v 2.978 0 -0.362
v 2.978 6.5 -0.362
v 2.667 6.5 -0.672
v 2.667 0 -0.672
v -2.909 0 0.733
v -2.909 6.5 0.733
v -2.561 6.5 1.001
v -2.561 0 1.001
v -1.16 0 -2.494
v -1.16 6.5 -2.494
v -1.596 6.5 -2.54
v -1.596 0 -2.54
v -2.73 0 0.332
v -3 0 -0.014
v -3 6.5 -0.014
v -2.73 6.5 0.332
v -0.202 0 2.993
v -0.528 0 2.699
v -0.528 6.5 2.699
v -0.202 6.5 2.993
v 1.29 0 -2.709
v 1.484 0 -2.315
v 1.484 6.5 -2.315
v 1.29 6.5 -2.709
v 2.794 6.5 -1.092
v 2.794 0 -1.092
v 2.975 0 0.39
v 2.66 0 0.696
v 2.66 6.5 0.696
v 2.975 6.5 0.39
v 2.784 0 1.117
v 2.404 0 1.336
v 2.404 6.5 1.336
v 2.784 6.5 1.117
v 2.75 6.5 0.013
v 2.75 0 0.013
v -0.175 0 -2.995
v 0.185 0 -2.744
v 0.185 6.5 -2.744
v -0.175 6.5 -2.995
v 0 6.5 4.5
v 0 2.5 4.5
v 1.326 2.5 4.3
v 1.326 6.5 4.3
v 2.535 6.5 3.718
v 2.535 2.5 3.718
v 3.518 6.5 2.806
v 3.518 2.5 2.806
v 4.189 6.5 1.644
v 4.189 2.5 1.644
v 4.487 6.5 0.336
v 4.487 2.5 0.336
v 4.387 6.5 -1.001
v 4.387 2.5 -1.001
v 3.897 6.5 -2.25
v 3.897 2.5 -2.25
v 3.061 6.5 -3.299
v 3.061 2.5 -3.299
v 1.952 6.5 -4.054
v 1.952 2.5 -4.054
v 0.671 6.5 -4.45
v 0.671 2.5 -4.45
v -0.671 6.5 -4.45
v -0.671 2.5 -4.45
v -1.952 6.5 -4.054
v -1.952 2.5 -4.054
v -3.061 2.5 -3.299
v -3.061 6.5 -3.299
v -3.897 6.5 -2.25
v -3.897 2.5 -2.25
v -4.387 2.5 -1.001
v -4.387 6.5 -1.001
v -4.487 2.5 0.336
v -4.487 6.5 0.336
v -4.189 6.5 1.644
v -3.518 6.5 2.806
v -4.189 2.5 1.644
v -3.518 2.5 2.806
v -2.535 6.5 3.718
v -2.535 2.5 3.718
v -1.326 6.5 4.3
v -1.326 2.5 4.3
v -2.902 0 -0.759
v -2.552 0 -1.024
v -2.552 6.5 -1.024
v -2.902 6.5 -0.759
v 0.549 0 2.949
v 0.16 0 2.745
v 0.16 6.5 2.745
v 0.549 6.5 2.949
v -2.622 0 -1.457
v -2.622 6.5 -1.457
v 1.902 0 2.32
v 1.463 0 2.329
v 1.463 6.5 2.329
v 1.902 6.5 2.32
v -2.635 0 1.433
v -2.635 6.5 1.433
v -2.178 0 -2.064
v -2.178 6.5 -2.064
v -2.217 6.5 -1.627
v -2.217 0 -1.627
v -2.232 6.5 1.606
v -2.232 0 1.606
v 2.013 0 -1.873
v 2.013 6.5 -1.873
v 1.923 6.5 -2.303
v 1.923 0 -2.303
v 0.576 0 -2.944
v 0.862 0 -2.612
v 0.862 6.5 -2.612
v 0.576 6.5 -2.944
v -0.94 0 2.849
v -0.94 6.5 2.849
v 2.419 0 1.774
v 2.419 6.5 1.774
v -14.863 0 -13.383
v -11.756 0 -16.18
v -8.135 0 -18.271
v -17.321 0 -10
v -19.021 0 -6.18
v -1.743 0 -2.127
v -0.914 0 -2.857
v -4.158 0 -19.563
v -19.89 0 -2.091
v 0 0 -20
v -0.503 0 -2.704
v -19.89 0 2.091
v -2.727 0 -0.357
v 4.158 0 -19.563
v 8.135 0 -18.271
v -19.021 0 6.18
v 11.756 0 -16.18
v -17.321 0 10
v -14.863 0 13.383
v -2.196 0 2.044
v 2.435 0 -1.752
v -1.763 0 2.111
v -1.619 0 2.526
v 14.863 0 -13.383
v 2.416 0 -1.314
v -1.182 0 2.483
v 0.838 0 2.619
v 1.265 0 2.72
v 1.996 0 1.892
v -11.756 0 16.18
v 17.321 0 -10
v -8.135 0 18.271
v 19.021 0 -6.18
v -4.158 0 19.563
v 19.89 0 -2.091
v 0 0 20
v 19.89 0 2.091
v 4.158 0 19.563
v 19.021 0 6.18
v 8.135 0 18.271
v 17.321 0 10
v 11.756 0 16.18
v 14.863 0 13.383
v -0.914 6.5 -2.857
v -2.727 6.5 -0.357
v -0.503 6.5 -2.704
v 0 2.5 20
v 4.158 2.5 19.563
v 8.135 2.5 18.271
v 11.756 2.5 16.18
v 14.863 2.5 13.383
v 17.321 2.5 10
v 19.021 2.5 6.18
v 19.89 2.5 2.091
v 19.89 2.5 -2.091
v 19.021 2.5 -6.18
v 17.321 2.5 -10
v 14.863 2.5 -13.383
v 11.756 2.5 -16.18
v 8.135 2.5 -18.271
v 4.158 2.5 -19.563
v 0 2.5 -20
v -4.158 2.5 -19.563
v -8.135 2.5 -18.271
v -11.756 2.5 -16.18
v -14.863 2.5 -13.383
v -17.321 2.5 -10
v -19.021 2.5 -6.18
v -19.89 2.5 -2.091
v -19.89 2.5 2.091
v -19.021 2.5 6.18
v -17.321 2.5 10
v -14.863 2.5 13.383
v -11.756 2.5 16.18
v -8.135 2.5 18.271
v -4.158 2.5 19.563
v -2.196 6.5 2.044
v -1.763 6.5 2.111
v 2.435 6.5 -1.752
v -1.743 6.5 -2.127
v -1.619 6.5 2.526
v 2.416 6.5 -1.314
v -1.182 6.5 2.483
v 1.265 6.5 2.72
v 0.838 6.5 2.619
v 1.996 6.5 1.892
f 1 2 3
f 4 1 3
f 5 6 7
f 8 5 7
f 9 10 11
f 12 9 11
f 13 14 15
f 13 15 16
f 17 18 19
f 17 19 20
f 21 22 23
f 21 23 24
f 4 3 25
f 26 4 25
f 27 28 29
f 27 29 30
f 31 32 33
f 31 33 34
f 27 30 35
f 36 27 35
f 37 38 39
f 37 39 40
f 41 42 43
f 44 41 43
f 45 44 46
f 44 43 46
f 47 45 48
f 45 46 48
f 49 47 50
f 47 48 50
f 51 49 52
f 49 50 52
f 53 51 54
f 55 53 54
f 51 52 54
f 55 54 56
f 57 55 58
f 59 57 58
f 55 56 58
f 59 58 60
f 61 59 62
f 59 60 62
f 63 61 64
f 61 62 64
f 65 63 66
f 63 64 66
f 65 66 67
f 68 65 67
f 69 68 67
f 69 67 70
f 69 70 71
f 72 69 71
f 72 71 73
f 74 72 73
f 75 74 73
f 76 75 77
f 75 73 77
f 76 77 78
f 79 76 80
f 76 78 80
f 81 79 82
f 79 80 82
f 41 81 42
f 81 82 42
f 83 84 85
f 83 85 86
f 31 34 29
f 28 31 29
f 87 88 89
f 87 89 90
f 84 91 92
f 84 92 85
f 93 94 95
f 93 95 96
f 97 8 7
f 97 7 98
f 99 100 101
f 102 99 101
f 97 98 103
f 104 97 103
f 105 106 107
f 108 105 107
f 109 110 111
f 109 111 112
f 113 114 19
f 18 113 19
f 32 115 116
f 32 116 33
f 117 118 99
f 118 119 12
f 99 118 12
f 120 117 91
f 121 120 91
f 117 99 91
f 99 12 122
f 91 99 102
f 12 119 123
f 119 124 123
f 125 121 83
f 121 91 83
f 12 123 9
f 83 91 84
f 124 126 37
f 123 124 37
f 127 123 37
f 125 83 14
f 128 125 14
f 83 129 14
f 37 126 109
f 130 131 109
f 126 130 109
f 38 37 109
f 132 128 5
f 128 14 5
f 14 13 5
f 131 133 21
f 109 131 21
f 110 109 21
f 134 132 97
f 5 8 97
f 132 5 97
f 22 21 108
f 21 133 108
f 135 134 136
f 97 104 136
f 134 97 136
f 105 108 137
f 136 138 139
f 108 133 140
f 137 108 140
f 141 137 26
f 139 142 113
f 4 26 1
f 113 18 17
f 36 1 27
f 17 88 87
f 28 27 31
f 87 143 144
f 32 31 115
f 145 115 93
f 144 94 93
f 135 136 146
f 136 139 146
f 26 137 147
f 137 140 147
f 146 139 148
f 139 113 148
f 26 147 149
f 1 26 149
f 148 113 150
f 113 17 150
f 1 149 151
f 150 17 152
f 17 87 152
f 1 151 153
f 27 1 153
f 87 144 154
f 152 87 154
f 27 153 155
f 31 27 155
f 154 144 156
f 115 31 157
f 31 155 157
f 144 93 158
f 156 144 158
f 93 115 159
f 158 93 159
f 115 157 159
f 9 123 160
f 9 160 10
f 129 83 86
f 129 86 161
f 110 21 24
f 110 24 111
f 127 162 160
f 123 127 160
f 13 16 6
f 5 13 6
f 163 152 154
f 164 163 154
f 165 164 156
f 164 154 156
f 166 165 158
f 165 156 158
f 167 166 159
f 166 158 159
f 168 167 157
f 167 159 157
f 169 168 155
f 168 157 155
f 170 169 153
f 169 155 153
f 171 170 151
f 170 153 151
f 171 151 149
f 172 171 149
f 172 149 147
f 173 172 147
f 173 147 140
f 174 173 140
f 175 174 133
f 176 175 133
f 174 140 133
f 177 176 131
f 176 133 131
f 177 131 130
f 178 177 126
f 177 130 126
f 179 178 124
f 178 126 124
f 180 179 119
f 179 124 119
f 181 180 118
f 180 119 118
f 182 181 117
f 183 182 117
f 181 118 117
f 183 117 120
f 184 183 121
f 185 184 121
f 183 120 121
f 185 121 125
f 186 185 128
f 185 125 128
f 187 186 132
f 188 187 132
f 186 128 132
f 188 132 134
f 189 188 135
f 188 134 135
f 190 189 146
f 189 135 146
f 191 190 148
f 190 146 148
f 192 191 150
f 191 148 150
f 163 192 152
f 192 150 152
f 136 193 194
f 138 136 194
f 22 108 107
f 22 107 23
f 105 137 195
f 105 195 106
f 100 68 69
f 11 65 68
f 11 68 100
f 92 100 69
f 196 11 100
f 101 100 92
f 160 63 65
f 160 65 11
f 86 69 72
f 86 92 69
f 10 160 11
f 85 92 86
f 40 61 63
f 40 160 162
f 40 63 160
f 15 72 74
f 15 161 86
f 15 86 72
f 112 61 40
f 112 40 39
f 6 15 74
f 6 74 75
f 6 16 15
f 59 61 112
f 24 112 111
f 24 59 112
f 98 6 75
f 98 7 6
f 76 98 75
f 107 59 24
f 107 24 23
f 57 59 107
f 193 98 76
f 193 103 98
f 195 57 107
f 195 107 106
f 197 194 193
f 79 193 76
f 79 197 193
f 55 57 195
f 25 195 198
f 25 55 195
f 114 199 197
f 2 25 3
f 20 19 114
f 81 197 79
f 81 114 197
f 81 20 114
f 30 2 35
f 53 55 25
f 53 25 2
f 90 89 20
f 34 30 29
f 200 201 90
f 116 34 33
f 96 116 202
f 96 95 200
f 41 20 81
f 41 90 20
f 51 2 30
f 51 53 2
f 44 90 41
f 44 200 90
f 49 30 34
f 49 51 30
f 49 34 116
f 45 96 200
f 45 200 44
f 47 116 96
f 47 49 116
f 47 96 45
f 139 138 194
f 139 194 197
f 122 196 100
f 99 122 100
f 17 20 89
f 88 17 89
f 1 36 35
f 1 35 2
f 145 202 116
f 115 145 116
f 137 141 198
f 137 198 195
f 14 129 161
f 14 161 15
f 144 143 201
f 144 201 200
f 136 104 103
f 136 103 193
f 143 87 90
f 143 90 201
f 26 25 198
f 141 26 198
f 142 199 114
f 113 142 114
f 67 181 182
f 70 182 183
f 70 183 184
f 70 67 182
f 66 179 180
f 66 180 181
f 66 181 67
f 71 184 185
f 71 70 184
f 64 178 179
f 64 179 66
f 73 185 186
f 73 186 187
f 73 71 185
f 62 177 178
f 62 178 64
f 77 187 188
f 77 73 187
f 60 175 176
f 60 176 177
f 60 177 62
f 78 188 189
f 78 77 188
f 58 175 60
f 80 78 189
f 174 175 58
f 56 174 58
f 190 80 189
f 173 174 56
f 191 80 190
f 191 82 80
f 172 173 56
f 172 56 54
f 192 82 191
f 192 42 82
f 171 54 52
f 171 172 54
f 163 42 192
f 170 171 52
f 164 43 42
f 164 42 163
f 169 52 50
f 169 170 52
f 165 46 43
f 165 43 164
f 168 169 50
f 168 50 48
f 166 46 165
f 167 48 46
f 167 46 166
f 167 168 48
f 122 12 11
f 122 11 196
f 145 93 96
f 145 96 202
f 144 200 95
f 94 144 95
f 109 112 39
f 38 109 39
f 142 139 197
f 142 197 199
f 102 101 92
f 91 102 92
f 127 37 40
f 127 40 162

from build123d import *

# Parameters (mm, degrees)
SKETCH2_R               = 20
BOSS_EXTRUDE1_DEPTH     = 2.5
SKETCH3_R               = 4.5
SKETCH3_R_2             = 2.75
BOSS_EXTRUDE2_DEPTH     = 4
CUT_EXTRUDE1_DEPTH      = 29.565713714
CUT_EXTRUDE1_DEPTH_BACK = 29.565713714
SKETCH3_3_R             = 2.75
CUT_EXTRUDE2_DEPTH      = 30.021543722
CIRPATTERN1_COUNT       = 25


with BuildPart() as part:
    # Sketch2 → Boss-Extrude1 (new body)
    with BuildSketch(Plane(origin=(0, 0, 0), x_dir=(1, 0, 0), z_dir=(0, 1, 0))):
        Circle(SKETCH2_R)
    extrude(amount=BOSS_EXTRUDE1_DEPTH)

    # Sketch3 → Boss-Extrude2 (add)
    with BuildSketch(Plane(origin=(0, 2.5, 0), x_dir=(1, 0, 0), z_dir=(0, 1, 0))):
        Circle(SKETCH3_R)
        Circle(SKETCH3_R_2, mode=Mode.SUBTRACT)
    extrude(amount=BOSS_EXTRUDE2_DEPTH)

    # Sketch3<3> → Cut-Extrude1 (cut, two sides: drawn at the far end of the back side and taken through both)
    with BuildSketch(Plane(origin=(0, 2.5, 0), x_dir=(1, 0, 0), z_dir=(0, 1, 0)).offset(-CUT_EXTRUDE1_DEPTH_BACK)):
        Circle(SKETCH3_3_R)
    extrude(amount=CUT_EXTRUDE1_DEPTH + CUT_EXTRUDE1_DEPTH_BACK, mode=Mode.SUBTRACT)

    # Sketch5 → Cut-Extrude2 (cut, symmetric)
    with BuildSketch(Plane(origin=(0, 6.5, 0), x_dir=(1, 0, 0), z_dir=(0, 1, 0))):
        with BuildLine():
            ThreePointArc((0.160191529, -2.74533034), (-0.185152758, -2.743759912), (-0.527577075, -2.698918752))
            Line((-0.527577075, -2.698918752), (-0.201984827, -2.993192632))
            Line((-0.201984827, -2.993192632), (0.160191529, -2.74533034))
        make_face()
    cut_extrude2 = extrude(amount=CUT_EXTRUDE2_DEPTH, both=True, mode=Mode.SUBTRACT)

    # CirPattern1: Cut-Extrude2 ×25 about axis
    cirpattern1_axis = Axis((0, -0.518707645, 0), (0, 1, 0))
    for i in range(1, CIRPATTERN1_COUNT):
        add(cut_extrude2.rotate(cirpattern1_axis, i * 360 / CIRPATTERN1_COUNT), mode=Mode.SUBTRACT)


solid = part.part
